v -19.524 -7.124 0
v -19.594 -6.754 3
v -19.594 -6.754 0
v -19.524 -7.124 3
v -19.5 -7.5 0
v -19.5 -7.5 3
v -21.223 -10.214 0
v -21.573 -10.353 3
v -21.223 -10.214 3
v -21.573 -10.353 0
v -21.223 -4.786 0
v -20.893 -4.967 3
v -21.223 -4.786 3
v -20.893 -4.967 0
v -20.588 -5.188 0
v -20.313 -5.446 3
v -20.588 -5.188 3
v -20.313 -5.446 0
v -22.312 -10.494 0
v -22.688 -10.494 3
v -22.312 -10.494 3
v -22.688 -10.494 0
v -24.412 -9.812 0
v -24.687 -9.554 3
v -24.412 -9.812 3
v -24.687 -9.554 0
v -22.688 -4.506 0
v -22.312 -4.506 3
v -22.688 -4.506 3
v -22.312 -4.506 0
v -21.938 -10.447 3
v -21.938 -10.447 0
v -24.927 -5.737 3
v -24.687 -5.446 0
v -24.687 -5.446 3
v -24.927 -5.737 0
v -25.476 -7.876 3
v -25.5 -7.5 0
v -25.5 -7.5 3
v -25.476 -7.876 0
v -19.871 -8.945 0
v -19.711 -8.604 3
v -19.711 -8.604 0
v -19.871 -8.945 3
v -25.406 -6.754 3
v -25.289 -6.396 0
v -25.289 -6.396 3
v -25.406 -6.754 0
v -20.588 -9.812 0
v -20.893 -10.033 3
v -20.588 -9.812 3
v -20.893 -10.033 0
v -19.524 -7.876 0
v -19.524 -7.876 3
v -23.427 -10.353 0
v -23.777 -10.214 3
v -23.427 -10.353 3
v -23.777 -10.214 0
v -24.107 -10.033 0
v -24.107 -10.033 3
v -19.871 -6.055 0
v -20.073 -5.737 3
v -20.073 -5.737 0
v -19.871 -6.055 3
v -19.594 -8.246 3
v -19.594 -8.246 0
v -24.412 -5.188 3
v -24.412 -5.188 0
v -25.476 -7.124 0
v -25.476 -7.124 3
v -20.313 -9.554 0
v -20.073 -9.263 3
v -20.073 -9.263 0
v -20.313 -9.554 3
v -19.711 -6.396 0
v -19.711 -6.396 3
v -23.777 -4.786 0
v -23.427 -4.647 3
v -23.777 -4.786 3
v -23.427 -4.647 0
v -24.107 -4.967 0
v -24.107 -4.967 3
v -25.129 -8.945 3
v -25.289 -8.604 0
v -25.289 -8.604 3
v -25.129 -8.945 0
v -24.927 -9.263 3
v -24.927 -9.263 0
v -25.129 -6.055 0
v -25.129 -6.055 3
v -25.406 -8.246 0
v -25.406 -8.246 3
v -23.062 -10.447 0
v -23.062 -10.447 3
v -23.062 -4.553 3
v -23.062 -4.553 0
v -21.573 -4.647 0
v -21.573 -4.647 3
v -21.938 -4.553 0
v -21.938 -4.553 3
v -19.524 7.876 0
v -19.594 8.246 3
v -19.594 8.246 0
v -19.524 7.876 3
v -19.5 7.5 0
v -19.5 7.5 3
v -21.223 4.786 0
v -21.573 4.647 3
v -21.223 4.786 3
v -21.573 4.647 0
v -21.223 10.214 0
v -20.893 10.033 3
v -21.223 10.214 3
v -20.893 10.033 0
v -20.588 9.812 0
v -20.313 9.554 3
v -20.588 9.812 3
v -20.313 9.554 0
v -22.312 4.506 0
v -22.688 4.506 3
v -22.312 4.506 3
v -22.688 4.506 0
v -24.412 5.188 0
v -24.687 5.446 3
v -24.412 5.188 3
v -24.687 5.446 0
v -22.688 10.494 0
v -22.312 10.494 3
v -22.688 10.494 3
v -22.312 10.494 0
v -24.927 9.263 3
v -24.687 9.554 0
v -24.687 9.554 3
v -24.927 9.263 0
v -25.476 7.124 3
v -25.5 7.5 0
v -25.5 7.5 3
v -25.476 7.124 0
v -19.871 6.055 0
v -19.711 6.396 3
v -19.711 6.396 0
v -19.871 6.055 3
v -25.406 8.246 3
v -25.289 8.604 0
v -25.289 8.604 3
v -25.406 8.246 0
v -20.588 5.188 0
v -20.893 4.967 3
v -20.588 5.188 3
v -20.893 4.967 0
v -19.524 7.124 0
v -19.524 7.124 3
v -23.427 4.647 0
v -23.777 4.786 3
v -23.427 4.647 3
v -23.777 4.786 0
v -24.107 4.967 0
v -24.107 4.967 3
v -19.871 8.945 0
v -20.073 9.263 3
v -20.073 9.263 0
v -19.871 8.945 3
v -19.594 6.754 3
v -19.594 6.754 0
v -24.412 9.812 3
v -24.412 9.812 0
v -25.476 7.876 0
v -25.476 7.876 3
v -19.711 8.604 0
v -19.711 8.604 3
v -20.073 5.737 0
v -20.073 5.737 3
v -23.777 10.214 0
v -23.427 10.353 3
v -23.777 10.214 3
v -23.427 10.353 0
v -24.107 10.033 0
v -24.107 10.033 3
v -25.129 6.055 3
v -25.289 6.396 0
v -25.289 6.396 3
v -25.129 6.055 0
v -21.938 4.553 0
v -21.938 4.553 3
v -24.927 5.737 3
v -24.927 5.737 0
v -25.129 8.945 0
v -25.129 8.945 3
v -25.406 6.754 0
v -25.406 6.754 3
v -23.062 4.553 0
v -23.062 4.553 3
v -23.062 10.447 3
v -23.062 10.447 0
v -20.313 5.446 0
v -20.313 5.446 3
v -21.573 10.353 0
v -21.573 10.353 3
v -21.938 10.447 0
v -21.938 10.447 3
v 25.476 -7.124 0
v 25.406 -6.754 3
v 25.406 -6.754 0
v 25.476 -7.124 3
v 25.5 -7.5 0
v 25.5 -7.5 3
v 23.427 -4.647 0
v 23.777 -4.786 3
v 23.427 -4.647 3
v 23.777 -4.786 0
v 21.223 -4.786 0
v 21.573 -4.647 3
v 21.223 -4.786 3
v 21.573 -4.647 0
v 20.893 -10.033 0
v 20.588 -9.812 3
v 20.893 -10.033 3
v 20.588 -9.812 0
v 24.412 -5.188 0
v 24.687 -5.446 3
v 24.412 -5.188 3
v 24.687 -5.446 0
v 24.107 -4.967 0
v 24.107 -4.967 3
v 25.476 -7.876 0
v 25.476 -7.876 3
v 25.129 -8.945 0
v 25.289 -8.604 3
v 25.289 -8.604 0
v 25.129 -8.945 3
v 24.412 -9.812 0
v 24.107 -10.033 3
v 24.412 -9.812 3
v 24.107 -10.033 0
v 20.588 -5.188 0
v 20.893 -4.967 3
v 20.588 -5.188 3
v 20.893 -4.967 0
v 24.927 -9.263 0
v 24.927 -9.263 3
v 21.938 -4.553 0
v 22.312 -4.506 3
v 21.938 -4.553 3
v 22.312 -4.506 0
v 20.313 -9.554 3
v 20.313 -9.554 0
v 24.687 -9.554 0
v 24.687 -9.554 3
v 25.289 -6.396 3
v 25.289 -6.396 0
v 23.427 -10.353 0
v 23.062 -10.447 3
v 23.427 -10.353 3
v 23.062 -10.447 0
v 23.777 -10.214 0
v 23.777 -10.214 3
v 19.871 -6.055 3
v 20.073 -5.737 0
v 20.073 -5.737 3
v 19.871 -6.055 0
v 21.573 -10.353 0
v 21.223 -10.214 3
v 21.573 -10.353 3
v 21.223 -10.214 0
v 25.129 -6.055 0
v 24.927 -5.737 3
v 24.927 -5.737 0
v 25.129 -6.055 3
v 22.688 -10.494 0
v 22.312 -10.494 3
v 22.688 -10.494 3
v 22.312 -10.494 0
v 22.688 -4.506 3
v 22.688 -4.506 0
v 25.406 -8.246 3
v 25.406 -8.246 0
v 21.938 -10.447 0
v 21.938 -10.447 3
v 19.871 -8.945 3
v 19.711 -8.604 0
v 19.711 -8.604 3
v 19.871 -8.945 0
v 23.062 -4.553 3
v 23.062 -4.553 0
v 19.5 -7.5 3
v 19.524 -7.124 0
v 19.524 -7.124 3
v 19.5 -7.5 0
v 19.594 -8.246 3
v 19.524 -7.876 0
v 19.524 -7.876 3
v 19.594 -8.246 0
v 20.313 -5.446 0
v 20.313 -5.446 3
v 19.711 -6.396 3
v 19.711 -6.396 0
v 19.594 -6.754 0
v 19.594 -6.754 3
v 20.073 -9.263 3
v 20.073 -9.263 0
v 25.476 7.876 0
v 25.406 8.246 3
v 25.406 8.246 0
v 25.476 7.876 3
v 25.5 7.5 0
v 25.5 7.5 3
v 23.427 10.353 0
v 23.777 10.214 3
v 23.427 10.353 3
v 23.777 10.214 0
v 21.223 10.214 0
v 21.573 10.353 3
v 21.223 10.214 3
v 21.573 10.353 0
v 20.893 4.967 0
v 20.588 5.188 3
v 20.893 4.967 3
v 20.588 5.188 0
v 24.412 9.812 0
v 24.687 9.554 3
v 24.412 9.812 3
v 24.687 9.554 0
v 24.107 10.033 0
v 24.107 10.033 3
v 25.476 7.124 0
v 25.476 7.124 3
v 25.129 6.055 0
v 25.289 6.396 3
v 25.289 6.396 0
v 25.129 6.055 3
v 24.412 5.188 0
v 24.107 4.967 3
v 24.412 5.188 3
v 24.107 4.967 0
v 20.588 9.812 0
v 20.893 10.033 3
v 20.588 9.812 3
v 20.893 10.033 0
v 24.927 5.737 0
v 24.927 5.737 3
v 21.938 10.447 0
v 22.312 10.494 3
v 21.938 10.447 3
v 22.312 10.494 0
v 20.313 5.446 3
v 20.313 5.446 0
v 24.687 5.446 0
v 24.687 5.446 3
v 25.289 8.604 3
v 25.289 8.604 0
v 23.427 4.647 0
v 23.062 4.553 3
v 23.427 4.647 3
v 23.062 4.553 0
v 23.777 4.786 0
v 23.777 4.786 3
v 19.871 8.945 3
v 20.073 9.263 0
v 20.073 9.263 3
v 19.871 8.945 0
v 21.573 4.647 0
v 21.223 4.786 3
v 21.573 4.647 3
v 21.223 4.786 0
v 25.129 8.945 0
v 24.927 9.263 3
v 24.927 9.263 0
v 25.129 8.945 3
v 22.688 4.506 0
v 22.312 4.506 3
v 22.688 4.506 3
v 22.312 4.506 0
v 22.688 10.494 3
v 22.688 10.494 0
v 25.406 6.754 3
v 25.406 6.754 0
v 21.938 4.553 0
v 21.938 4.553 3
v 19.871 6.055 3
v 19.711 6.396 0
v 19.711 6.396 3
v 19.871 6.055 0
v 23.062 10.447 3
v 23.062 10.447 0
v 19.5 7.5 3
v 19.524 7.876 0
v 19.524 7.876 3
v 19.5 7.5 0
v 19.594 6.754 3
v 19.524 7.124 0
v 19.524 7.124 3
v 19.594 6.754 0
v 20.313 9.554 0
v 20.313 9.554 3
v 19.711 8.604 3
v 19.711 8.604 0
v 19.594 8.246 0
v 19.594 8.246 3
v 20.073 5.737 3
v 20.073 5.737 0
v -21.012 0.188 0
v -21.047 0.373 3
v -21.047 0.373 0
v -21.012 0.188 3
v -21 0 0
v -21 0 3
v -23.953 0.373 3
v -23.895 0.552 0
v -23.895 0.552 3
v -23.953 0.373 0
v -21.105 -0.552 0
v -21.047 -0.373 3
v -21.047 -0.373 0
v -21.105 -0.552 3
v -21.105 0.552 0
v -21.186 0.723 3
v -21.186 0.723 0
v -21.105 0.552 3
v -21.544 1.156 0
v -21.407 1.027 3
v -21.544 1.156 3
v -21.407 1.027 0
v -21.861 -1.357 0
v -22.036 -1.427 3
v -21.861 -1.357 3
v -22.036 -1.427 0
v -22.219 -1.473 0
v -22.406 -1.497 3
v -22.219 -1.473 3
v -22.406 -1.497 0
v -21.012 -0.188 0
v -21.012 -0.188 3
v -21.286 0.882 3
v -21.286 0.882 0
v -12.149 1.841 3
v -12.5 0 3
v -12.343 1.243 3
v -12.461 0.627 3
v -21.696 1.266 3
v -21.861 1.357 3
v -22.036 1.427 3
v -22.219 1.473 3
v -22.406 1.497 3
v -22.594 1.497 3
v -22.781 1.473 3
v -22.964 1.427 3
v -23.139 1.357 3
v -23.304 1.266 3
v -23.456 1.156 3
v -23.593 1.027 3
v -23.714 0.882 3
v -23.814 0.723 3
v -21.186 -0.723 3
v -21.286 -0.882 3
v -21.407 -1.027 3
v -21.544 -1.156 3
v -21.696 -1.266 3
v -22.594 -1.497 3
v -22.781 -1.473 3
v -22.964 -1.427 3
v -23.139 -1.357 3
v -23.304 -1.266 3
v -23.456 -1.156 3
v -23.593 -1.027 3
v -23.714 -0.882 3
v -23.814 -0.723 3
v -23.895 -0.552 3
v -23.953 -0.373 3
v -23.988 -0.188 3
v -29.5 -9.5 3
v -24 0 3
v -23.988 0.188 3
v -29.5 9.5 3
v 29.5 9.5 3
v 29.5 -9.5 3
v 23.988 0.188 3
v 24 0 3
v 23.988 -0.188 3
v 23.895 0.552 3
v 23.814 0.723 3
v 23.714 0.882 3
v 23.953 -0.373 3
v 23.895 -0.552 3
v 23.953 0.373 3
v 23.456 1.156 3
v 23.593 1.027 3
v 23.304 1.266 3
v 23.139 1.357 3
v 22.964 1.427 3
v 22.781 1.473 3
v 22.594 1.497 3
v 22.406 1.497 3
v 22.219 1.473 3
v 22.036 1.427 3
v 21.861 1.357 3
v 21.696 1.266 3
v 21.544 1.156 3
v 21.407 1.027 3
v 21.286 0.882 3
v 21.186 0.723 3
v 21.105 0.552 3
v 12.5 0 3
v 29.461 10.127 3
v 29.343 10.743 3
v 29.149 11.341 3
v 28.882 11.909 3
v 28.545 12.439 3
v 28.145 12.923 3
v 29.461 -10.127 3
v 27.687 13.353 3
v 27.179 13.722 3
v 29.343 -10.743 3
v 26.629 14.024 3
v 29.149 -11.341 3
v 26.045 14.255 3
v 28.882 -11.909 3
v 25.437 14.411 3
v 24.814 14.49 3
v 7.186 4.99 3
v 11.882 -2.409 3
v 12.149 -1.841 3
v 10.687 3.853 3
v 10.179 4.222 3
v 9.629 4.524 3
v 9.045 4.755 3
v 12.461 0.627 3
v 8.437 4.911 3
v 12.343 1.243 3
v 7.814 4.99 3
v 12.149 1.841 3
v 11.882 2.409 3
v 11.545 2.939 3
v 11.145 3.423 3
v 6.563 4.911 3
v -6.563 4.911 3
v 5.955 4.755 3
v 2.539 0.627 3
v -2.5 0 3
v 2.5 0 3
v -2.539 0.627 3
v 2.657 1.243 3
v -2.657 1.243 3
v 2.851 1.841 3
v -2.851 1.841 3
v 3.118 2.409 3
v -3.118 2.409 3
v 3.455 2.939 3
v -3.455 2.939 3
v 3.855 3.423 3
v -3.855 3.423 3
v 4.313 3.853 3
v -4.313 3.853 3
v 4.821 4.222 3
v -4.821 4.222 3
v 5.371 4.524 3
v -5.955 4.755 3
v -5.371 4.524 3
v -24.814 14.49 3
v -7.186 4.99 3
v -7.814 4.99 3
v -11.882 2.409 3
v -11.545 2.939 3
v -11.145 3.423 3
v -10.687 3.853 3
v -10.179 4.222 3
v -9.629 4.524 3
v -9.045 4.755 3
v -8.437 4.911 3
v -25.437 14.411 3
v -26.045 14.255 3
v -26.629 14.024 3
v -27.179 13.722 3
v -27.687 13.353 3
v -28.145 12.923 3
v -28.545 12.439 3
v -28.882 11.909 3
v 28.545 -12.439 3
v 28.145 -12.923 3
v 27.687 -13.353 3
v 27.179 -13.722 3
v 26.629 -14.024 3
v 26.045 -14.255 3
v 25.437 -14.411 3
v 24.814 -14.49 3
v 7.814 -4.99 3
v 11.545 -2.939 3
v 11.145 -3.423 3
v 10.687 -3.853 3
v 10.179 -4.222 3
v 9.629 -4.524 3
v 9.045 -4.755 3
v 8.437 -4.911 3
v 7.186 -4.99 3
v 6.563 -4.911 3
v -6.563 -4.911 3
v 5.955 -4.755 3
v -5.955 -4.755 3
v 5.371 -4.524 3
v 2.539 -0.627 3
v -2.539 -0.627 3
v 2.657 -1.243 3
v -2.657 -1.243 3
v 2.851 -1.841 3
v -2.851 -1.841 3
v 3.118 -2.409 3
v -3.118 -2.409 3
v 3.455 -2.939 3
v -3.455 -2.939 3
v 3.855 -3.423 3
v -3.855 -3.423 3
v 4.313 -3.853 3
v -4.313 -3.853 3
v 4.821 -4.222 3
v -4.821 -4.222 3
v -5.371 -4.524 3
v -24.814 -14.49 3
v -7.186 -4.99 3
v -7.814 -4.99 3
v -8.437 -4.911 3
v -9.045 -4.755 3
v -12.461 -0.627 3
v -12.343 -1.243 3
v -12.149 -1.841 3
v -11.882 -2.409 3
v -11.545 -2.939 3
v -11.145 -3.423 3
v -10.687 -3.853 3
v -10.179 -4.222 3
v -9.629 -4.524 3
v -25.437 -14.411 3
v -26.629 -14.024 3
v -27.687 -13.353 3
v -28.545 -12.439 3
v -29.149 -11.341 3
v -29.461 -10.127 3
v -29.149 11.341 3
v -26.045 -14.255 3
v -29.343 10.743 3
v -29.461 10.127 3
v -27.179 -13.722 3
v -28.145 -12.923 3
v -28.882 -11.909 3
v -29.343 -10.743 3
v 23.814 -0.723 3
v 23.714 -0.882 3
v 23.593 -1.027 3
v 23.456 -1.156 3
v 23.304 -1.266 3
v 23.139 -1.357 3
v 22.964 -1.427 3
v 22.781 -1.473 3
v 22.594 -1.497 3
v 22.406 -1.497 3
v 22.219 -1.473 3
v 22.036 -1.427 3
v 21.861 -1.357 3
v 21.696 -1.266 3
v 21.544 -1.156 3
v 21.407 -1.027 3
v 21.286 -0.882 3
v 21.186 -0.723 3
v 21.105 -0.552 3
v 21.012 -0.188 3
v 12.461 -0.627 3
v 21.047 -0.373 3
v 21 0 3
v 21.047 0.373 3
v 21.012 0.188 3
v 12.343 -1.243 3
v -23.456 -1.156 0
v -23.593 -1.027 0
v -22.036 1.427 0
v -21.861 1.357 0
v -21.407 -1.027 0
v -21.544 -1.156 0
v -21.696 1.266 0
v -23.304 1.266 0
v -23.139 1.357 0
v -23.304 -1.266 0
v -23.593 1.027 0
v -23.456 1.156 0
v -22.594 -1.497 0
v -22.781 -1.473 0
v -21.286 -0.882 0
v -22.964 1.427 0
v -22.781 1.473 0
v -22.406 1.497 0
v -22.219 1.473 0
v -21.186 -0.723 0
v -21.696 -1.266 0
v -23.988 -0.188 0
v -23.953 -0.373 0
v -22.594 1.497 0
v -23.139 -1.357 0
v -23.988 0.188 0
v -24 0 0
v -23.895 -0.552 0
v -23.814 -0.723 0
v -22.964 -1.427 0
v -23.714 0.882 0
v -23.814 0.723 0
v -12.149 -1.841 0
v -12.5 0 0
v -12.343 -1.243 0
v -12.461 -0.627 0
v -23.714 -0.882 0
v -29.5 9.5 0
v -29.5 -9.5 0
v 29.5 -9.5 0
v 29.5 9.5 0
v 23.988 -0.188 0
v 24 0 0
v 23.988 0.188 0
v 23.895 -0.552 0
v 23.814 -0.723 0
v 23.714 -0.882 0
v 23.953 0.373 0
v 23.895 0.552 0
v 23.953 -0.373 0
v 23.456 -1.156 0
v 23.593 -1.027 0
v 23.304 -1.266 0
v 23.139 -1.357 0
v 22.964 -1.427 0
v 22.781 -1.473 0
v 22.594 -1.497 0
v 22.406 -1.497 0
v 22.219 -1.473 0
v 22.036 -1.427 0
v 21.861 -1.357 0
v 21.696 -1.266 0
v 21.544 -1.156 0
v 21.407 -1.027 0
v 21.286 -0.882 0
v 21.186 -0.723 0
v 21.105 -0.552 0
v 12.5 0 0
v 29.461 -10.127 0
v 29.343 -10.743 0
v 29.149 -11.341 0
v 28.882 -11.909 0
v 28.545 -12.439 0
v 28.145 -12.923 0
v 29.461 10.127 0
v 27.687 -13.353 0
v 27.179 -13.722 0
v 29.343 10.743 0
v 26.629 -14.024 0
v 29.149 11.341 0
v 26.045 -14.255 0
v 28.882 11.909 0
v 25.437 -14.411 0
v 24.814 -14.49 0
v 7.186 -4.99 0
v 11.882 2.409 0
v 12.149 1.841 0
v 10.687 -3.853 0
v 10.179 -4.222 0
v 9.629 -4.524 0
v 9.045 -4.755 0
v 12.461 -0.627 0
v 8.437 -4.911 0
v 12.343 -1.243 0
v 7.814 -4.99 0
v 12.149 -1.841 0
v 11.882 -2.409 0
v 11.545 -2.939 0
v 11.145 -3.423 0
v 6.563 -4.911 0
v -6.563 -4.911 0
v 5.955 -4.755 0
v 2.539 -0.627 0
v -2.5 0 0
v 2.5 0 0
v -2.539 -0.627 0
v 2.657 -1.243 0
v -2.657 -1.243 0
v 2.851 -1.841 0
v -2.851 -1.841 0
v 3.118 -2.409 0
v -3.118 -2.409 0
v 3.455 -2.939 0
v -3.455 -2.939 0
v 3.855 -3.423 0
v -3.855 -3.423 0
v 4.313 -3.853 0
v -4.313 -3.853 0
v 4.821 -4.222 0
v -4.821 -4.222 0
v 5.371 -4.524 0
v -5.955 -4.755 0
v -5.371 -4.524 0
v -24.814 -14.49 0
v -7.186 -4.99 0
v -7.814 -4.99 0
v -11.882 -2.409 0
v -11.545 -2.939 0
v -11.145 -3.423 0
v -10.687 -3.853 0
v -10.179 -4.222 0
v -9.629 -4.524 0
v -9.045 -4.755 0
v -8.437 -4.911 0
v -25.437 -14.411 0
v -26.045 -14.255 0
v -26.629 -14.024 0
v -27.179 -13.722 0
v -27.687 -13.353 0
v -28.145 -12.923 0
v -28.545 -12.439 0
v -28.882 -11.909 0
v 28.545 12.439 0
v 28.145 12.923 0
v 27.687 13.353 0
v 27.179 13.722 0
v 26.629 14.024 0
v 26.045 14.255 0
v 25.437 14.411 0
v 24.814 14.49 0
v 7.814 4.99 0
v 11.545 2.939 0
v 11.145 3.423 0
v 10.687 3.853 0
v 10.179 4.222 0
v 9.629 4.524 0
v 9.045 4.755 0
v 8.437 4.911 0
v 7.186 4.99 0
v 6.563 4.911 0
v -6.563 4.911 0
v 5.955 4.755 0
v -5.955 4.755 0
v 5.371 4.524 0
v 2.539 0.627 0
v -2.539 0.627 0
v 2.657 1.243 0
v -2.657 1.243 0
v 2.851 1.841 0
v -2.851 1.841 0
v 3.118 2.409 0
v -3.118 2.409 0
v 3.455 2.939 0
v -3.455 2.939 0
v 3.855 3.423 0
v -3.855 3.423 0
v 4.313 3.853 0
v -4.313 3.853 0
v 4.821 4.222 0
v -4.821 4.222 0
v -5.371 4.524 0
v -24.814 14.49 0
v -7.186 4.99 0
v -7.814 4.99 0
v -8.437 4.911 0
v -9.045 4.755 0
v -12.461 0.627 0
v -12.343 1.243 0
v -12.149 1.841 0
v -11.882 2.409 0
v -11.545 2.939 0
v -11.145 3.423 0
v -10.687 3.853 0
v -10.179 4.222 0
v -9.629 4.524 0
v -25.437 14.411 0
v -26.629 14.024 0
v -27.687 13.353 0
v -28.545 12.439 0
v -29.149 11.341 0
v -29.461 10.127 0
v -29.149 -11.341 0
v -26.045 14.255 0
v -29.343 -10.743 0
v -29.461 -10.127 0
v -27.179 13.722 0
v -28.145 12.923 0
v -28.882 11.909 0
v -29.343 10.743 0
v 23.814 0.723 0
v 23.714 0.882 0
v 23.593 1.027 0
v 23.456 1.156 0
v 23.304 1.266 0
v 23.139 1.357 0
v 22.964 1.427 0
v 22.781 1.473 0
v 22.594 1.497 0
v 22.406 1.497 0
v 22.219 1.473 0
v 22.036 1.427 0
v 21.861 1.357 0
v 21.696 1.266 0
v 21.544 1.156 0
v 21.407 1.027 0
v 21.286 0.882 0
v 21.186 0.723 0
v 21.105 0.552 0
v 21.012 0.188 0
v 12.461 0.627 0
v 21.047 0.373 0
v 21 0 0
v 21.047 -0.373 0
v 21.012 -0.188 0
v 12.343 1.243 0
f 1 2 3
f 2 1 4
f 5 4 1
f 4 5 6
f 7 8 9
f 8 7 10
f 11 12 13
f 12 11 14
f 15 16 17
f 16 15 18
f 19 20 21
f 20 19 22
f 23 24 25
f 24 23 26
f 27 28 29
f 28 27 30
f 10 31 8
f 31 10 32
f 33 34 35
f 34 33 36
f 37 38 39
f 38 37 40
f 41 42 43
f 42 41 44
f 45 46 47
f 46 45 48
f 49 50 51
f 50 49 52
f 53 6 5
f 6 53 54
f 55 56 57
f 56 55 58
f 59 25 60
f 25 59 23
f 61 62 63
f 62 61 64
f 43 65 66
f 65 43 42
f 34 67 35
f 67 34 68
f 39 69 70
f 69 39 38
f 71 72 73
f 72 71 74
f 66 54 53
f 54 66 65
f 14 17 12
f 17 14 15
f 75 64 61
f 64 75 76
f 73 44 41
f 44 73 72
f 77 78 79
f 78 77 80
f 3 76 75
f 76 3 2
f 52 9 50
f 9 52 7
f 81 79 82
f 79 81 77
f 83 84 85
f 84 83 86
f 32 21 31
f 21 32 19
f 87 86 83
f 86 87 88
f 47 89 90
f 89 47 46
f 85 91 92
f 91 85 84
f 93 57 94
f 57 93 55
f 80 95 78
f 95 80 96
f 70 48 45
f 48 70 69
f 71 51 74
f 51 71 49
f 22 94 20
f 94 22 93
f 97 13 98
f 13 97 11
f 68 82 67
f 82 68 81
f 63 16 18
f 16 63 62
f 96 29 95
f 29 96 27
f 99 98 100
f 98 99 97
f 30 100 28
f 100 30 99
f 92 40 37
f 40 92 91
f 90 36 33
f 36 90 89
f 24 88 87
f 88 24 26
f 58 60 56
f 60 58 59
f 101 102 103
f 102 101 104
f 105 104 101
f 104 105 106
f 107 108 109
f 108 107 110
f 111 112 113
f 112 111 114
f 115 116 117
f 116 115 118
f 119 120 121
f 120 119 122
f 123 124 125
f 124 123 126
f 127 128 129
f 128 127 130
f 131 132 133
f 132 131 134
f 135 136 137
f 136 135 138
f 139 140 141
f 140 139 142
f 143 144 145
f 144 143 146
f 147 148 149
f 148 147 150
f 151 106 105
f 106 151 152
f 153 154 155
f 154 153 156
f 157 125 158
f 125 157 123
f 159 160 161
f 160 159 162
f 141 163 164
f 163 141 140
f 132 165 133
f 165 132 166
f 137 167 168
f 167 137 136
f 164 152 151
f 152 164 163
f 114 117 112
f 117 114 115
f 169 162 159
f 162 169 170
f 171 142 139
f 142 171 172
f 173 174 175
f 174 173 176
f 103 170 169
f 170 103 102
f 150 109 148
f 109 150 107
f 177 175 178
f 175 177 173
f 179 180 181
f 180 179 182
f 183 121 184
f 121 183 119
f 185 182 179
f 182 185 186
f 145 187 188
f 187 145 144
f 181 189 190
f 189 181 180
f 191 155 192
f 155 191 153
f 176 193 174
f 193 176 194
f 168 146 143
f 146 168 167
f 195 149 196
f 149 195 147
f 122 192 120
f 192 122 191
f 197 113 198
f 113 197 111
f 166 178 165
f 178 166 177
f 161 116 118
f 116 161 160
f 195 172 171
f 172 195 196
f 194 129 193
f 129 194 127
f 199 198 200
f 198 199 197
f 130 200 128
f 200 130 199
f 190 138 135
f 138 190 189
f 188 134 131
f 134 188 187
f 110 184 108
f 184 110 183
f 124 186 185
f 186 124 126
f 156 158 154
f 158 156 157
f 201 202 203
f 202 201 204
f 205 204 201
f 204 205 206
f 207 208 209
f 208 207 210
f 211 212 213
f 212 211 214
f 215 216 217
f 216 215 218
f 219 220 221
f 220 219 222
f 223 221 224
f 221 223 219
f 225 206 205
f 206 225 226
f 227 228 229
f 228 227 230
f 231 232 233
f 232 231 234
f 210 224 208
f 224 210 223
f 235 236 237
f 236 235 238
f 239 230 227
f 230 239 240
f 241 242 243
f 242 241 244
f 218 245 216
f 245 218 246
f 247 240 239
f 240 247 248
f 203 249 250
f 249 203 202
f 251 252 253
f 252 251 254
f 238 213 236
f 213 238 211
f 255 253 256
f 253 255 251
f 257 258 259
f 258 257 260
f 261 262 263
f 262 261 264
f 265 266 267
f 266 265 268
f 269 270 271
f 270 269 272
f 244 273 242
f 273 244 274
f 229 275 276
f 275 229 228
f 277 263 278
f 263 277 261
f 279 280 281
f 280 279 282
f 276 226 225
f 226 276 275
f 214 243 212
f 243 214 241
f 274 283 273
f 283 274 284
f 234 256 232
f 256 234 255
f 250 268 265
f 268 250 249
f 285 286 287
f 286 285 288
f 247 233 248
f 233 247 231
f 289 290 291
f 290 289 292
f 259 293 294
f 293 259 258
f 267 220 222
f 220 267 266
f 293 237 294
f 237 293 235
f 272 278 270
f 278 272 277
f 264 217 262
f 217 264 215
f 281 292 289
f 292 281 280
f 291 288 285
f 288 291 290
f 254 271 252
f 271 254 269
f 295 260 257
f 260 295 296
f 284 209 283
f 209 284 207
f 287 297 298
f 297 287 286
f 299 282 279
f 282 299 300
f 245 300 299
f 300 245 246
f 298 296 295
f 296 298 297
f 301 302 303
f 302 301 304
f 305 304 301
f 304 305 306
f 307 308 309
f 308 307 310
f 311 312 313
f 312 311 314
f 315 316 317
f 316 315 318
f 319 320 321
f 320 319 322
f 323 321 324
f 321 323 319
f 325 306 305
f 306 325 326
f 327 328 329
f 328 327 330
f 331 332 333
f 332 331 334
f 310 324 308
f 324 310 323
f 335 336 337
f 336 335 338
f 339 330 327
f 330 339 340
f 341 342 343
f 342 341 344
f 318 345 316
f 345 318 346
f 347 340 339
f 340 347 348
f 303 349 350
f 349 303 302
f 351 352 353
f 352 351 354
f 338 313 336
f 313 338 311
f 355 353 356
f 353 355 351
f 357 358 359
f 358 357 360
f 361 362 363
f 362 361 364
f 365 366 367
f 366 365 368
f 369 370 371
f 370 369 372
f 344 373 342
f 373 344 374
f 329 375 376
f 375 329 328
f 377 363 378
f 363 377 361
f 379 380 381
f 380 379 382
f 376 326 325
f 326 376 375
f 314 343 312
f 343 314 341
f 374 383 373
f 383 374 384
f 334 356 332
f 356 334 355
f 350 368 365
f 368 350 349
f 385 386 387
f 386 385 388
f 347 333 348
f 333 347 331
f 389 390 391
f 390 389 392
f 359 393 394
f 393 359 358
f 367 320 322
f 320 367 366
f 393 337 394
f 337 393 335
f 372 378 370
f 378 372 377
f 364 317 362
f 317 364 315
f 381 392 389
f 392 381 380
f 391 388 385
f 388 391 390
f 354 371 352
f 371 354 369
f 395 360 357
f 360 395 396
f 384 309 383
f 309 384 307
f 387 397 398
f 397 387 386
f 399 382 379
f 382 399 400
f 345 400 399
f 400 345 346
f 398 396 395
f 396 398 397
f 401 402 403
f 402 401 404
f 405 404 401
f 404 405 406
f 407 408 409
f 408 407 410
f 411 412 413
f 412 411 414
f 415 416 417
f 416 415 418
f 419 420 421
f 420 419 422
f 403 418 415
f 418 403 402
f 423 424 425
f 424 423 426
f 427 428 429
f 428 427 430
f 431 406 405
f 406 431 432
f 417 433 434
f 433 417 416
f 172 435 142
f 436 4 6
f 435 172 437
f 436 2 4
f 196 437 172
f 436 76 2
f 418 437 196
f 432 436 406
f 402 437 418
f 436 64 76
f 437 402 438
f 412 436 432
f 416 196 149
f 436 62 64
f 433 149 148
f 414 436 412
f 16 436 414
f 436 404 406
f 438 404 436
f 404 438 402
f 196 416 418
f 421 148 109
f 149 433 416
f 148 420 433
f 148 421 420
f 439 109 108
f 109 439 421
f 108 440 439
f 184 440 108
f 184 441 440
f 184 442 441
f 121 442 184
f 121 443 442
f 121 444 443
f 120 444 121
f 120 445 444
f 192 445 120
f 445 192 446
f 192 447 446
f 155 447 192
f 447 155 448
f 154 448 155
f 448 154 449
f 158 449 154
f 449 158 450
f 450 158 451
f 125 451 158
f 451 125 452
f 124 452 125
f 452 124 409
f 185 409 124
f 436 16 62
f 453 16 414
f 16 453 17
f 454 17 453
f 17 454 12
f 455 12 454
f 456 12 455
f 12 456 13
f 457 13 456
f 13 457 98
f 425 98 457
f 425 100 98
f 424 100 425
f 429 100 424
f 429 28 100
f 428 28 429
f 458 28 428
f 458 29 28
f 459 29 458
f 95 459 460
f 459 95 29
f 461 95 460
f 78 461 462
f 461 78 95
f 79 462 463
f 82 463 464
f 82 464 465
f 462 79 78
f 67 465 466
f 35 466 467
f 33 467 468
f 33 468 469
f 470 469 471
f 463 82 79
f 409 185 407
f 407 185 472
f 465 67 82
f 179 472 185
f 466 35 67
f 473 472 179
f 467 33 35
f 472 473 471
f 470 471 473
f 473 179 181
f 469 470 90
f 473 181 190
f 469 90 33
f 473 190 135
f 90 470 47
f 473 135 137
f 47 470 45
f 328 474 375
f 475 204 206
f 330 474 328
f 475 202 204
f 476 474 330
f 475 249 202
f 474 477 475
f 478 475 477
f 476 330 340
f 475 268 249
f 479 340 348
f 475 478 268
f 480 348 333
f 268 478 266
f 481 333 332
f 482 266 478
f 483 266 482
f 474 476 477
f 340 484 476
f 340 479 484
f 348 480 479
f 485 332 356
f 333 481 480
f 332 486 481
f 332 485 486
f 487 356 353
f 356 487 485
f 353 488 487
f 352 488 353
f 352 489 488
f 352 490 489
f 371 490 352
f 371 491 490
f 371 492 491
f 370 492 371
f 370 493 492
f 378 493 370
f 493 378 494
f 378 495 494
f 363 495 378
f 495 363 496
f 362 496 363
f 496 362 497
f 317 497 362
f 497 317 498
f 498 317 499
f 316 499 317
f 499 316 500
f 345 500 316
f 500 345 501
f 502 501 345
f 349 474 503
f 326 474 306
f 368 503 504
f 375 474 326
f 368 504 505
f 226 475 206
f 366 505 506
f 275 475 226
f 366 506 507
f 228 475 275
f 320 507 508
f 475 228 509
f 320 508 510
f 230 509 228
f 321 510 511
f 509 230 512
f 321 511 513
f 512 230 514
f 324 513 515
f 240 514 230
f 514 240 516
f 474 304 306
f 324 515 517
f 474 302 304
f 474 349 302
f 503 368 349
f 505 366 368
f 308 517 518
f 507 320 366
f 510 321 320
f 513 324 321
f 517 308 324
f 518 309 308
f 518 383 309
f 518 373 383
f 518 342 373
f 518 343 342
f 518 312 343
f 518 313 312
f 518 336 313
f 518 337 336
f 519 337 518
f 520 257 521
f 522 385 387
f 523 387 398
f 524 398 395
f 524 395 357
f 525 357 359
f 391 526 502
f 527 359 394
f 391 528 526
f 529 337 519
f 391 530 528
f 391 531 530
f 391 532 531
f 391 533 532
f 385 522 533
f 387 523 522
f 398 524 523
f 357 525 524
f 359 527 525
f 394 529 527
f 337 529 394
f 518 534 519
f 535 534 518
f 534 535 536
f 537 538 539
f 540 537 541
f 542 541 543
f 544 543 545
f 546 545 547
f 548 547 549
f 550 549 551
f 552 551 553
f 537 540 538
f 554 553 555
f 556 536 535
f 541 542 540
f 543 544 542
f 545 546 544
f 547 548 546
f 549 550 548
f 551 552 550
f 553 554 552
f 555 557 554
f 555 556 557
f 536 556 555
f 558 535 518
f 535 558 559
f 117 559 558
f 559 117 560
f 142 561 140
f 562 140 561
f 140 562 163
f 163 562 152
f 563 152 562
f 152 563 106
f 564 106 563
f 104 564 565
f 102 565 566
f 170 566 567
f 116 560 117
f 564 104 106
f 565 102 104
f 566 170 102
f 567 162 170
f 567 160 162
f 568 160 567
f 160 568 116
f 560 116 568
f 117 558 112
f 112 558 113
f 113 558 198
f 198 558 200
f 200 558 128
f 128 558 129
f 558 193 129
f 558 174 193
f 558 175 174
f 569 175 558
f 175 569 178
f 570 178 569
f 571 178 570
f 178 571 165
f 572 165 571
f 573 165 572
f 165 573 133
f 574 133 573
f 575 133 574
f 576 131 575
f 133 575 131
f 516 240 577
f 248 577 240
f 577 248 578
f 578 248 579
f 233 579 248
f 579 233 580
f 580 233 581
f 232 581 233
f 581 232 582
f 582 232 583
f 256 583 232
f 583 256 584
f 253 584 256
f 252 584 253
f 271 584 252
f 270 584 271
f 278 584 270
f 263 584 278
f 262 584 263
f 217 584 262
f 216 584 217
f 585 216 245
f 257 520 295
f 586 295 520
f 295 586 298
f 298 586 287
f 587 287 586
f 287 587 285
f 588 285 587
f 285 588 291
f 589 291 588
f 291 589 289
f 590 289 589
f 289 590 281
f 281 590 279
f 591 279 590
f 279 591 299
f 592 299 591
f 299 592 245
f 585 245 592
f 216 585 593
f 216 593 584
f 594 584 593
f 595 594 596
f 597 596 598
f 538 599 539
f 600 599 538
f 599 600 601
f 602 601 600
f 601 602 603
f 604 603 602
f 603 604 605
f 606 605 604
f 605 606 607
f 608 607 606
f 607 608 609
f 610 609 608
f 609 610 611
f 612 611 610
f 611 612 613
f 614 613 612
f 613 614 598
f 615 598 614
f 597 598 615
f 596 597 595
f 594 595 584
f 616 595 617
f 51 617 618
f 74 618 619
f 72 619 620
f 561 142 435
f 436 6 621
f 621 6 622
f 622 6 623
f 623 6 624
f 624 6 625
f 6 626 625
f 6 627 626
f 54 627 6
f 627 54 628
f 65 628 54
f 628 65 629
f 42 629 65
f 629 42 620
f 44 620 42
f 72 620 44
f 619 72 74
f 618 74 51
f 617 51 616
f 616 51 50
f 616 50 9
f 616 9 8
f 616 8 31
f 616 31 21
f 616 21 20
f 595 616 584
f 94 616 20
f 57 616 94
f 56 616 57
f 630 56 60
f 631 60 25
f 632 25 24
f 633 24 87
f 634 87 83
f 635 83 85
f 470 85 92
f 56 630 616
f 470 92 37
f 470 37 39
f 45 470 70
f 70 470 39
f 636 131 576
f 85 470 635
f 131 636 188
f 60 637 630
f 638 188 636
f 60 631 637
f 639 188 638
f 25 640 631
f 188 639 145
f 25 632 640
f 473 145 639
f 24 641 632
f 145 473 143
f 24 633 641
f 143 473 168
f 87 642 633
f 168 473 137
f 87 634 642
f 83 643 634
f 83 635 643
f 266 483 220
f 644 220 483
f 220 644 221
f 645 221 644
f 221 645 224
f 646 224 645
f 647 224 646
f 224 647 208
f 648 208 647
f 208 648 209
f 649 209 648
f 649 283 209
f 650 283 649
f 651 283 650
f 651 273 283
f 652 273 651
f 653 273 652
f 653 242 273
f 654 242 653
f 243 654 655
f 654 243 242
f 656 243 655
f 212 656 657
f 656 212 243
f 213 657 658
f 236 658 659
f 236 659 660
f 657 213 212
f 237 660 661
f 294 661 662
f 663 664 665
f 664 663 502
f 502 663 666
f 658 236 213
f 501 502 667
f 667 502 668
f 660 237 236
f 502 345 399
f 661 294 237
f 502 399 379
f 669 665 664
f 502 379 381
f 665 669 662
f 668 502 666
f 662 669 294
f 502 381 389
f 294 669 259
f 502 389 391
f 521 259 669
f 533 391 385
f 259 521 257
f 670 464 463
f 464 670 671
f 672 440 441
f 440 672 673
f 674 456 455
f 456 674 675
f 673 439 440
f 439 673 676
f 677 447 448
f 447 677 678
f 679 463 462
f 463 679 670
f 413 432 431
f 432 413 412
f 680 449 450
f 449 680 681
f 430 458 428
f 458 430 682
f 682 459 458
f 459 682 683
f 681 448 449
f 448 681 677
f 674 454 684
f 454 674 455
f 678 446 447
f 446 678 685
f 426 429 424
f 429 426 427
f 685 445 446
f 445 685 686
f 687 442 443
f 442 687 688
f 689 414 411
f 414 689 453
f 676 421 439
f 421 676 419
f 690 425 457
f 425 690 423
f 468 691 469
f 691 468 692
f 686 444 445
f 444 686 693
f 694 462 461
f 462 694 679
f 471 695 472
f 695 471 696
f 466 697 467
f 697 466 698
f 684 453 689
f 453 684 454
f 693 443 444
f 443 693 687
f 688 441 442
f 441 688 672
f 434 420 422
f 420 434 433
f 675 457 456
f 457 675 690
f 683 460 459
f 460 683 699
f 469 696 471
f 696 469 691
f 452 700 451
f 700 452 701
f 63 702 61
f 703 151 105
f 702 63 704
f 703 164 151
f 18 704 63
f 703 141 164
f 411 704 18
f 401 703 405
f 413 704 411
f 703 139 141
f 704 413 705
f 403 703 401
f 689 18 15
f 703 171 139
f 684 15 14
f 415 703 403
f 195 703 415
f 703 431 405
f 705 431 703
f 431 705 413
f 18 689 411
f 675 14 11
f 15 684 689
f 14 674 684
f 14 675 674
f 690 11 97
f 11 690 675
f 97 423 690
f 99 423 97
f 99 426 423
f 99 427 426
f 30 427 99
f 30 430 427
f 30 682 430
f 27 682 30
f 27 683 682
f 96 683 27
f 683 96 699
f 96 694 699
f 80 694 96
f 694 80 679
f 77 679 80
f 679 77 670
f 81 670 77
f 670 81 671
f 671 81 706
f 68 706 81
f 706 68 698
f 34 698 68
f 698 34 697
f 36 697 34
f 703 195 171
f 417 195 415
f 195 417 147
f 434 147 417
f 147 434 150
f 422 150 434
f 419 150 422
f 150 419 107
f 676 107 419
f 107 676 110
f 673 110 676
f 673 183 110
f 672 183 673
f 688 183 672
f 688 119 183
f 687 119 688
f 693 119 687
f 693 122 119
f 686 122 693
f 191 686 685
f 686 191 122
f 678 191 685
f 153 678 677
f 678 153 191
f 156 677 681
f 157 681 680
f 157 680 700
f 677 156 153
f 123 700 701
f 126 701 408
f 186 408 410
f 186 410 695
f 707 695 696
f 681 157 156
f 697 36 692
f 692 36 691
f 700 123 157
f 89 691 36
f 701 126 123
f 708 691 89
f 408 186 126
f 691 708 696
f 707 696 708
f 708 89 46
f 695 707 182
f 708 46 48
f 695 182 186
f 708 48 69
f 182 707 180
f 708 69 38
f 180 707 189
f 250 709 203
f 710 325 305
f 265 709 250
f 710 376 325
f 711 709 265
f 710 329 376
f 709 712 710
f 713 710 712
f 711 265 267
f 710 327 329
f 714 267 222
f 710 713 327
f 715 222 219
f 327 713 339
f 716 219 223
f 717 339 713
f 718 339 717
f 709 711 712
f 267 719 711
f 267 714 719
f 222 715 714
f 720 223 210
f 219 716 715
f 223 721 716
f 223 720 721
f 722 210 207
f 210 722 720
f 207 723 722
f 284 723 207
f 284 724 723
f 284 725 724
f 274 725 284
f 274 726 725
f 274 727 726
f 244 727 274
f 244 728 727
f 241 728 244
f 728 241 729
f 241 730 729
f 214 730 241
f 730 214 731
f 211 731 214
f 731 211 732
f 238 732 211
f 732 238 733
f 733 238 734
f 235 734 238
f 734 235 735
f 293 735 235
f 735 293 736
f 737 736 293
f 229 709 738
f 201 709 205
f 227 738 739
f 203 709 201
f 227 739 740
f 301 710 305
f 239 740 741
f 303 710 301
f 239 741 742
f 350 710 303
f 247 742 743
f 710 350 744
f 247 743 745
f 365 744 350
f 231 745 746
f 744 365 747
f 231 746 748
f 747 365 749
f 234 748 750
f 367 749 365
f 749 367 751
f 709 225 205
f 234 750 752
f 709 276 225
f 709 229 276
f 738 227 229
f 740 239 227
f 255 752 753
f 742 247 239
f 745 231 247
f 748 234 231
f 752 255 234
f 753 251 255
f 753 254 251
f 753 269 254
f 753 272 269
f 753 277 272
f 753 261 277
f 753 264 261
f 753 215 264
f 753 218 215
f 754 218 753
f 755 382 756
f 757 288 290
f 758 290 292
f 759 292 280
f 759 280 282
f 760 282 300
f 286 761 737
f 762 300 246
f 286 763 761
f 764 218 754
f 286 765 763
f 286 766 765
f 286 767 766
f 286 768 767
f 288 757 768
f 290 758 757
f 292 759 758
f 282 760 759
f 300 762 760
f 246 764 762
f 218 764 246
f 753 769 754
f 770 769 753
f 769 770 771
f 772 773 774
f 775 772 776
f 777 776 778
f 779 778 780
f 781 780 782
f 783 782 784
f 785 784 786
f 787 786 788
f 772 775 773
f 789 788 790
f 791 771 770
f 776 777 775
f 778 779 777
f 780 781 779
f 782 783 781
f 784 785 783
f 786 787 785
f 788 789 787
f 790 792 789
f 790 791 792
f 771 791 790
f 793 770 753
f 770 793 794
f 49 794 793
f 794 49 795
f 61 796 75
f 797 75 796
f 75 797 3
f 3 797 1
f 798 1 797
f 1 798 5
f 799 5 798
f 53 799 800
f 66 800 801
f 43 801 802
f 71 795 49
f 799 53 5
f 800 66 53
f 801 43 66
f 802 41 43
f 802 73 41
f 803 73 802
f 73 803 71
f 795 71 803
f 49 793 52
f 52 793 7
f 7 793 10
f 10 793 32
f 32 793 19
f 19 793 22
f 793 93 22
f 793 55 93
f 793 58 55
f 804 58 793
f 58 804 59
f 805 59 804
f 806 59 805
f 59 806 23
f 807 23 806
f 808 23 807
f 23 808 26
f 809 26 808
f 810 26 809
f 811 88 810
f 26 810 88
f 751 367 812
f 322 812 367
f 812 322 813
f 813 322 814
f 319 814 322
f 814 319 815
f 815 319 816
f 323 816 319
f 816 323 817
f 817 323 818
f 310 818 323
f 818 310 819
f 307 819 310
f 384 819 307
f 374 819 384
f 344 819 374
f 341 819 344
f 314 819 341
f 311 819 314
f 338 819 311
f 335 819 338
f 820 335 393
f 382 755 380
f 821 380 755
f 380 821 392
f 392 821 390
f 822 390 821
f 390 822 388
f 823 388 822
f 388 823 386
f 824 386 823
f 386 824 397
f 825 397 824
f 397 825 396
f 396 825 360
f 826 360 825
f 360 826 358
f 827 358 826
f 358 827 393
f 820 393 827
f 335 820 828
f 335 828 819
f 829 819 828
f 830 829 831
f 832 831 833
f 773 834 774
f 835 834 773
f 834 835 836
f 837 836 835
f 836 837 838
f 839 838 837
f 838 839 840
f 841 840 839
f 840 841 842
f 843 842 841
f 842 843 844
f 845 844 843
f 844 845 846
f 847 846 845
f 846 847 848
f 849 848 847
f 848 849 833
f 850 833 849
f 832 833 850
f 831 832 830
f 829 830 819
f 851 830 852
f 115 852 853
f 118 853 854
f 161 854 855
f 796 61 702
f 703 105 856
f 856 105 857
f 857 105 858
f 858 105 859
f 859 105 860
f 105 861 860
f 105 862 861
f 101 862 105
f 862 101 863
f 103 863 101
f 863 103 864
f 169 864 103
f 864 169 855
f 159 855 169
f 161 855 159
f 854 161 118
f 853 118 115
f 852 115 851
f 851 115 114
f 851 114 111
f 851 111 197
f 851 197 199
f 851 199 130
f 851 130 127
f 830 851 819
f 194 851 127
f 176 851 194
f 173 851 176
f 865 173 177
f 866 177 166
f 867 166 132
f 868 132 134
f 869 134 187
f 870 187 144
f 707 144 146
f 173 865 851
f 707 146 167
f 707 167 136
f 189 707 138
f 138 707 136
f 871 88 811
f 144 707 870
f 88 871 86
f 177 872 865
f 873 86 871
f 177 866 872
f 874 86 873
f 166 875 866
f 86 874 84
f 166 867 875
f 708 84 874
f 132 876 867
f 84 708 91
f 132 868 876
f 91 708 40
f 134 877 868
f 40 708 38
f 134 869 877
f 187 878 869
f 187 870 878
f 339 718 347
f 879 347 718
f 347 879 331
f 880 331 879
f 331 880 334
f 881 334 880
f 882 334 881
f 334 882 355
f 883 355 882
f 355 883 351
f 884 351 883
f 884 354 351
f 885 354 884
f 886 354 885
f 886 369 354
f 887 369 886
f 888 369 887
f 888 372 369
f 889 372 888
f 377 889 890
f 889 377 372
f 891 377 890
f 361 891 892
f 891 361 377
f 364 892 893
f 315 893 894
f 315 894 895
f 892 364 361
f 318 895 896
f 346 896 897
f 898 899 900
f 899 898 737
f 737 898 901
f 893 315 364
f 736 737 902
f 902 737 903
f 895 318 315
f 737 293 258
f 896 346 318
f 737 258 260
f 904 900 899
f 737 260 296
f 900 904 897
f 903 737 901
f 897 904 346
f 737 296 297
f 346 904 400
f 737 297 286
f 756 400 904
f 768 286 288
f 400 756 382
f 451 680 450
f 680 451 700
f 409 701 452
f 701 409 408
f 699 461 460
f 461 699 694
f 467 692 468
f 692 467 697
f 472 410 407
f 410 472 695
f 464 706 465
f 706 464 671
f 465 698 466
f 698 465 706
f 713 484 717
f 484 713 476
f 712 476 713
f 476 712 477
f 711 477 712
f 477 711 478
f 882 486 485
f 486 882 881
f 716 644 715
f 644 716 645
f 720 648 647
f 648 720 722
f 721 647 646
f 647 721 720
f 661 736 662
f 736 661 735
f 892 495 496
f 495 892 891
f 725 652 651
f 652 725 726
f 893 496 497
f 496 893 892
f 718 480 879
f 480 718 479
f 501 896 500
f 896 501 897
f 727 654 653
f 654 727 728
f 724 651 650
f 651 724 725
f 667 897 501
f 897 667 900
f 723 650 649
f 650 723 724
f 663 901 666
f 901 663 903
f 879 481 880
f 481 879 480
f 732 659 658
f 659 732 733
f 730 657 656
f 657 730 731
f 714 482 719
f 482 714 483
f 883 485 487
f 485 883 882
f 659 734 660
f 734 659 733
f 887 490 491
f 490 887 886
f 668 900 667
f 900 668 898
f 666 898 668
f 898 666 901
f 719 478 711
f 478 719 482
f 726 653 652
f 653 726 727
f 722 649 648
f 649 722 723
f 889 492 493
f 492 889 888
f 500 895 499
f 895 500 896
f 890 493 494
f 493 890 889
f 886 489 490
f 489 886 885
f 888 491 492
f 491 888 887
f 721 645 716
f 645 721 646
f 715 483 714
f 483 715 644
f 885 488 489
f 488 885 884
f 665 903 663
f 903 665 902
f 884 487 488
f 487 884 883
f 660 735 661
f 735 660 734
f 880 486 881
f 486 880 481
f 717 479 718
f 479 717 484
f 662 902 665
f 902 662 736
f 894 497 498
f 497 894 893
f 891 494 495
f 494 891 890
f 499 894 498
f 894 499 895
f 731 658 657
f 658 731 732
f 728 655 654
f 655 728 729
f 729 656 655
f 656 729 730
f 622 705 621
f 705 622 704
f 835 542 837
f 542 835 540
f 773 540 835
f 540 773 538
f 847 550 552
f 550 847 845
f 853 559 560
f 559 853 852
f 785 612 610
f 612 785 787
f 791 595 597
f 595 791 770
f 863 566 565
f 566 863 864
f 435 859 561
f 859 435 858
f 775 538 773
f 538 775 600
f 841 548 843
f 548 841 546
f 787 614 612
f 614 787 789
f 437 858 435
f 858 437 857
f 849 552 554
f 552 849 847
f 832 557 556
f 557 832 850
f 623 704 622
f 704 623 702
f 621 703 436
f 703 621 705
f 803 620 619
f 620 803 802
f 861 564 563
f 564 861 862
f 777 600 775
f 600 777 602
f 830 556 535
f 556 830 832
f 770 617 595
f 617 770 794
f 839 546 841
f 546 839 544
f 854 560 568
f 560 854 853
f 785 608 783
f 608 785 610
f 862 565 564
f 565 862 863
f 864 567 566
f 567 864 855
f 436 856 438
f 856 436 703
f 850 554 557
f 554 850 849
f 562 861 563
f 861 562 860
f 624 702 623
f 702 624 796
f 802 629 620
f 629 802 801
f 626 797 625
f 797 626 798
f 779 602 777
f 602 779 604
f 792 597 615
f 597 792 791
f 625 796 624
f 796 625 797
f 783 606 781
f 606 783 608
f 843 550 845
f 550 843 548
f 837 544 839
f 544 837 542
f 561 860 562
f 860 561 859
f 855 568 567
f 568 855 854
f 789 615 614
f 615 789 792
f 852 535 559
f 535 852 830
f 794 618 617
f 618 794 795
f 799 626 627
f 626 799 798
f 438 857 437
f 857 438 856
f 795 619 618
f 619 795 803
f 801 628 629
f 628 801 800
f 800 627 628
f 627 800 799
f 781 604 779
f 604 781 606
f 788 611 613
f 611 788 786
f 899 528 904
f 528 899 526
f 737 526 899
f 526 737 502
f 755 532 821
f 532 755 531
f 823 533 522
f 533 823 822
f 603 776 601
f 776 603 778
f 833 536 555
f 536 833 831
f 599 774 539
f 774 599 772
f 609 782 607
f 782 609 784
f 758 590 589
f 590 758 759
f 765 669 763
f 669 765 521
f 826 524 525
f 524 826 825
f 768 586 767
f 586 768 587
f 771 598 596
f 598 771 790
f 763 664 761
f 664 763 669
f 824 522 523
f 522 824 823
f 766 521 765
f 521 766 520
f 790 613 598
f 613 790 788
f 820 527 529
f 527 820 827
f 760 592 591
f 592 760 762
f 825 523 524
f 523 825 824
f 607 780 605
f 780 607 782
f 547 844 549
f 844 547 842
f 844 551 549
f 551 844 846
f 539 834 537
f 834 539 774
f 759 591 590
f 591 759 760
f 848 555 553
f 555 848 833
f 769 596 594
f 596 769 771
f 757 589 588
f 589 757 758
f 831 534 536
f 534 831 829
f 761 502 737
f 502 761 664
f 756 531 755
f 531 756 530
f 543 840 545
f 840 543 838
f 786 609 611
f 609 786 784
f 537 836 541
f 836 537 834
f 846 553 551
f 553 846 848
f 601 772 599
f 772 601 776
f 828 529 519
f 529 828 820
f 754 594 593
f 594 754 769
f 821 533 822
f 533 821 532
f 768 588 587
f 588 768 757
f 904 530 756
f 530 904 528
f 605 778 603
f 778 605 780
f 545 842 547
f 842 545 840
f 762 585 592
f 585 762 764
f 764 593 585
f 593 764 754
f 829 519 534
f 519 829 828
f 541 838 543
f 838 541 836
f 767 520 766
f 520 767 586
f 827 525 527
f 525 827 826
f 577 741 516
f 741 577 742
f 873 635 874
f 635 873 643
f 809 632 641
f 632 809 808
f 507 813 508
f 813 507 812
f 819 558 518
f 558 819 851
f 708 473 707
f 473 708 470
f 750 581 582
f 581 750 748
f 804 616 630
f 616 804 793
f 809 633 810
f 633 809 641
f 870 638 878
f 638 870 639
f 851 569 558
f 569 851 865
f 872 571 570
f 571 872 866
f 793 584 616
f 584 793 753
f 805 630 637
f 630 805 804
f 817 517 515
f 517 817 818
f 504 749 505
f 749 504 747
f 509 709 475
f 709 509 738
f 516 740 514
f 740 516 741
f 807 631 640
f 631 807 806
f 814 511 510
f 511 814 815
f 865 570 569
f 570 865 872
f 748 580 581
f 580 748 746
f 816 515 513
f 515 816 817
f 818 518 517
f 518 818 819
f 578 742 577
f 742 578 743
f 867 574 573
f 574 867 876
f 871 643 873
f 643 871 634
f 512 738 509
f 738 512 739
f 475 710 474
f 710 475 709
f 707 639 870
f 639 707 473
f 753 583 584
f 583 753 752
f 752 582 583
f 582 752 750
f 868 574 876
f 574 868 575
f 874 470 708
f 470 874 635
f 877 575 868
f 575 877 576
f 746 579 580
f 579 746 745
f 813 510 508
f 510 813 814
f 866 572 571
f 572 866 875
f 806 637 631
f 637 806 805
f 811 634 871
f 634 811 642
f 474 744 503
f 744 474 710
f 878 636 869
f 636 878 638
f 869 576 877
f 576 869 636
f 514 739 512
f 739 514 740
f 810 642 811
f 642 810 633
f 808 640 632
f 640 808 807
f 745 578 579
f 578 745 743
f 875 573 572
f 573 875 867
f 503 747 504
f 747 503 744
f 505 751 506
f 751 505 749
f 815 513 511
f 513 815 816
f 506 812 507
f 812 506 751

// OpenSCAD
$fn = 50;


difference() {
	union() {
		hull() {
			translate(v = [-24.5000000000, 9.5000000000, 0]) {
				cylinder(h = 3, r = 5);
			}
			translate(v = [24.5000000000, 9.5000000000, 0]) {
				cylinder(h = 3, r = 5);
			}
			translate(v = [-24.5000000000, -9.5000000000, 0]) {
				cylinder(h = 3, r = 5);
			}
			translate(v = [24.5000000000, -9.5000000000, 0]) {
				cylinder(h = 3, r = 5);
			}
		}
	}
	union() {
		#translate(v = [-22.5000000000, -7.5000000000, 0]) {
			cylinder(h = 3, r = 3.0000000000);
		}
		#translate(v = [-22.5000000000, 7.5000000000, 0]) {
			cylinder(h = 3, r = 3.0000000000);
		}
		#translate(v = [22.5000000000, -7.5000000000, 0]) {
			cylinder(h = 3, r = 3.0000000000);
		}
		#translate(v = [22.5000000000, 7.5000000000, 0]) {
			cylinder(h = 3, r = 3.0000000000);
		}
		#translate(v = [-22.5000000000, -7.5000000000, -100.0000000000]) {
			cylinder(h = 200, r = 3.0000000000);
		}
		#translate(v = [-22.5000000000, 7.5000000000, -100.0000000000]) {
			cylinder(h = 200, r = 3.0000000000);
		}
		#translate(v = [22.5000000000, -7.5000000000, -100.0000000000]) {
			cylinder(h = 200, r = 3.0000000000);
		}
		#translate(v = [22.5000000000, 7.5000000000, -100.0000000000]) {
			cylinder(h = 200, r = 3.0000000000);
		}
		#translate(v = [-22.5000000000, -7.5000000000, 0]) {
			cylinder(h = 3, r = 1.5000000000);
		}
		#translate(v = [-22.5000000000, 0.0000000000, 0]) {
			cylinder(h = 3, r = 1.5000000000);
		}
		#translate(v = [-22.5000000000, 7.5000000000, 0]) {
			cylinder(h = 3, r = 1.5000000000);
		}
		#translate(v = [22.5000000000, -7.5000000000, 0]) {
			cylinder(h = 3, r = 1.5000000000);
		}
		#translate(v = [22.5000000000, 0.0000000000, 0]) {
			cylinder(h = 3, r = 1.5000000000);
		}
		#translate(v = [22.5000000000, 7.5000000000, 0]) {
			cylinder(h = 3, r = 1.5000000000);
		}
		#translate(v = [-22.5000000000, -7.5000000000, 0]) {
			cylinder(h = 3, r = 1.5000000000);
		}
		#translate(v = [-22.5000000000, 0.0000000000, 0]) {
			cylinder(h = 3, r = 1.5000000000);
		}
		#translate(v = [-22.5000000000, 7.5000000000, 0]) {
			cylinder(h = 3, r = 1.5000000000);
		}
		#translate(v = [22.5000000000, -7.5000000000, 0]) {
			cylinder(h = 3, r = 1.5000000000);
		}
		#translate(v = [22.5000000000, 0.0000000000, 0]) {
			cylinder(h = 3, r = 1.5000000000);
		}
		#translate(v = [22.5000000000, 7.5000000000, 0]) {
			cylinder(h = 3, r = 1.5000000000);
		}
		#translate(v = [-22.5000000000, -7.5000000000, 0]) {
			cylinder(h = 3, r = 1.5000000000);
		}
		#translate(v = [-22.5000000000, 0.0000000000, 0]) {
			cylinder(h = 3, r = 1.5000000000);
		}
		#translate(v = [-22.5000000000, 7.5000000000, 0]) {
			cylinder(h = 3, r = 1.5000000000);
		}
		#translate(v = [22.5000000000, -7.5000000000, 0]) {
			cylinder(h = 3, r = 1.5000000000);
		}
		#translate(v = [22.5000000000, 0.0000000000, 0]) {
			cylinder(h = 3, r = 1.5000000000);
		}
		#translate(v = [22.5000000000, 7.5000000000, 0]) {
			cylinder(h = 3, r = 1.5000000000);
		}
		#translate(v = [-7.5000000000, 0, 0]) {
			cylinder(h = 3, r = 5.0000000000);
		}
		#translate(v = [7.5000000000, 0, 0]) {
			cylinder(h = 3, r = 5.0000000000);
		}
	}
}
